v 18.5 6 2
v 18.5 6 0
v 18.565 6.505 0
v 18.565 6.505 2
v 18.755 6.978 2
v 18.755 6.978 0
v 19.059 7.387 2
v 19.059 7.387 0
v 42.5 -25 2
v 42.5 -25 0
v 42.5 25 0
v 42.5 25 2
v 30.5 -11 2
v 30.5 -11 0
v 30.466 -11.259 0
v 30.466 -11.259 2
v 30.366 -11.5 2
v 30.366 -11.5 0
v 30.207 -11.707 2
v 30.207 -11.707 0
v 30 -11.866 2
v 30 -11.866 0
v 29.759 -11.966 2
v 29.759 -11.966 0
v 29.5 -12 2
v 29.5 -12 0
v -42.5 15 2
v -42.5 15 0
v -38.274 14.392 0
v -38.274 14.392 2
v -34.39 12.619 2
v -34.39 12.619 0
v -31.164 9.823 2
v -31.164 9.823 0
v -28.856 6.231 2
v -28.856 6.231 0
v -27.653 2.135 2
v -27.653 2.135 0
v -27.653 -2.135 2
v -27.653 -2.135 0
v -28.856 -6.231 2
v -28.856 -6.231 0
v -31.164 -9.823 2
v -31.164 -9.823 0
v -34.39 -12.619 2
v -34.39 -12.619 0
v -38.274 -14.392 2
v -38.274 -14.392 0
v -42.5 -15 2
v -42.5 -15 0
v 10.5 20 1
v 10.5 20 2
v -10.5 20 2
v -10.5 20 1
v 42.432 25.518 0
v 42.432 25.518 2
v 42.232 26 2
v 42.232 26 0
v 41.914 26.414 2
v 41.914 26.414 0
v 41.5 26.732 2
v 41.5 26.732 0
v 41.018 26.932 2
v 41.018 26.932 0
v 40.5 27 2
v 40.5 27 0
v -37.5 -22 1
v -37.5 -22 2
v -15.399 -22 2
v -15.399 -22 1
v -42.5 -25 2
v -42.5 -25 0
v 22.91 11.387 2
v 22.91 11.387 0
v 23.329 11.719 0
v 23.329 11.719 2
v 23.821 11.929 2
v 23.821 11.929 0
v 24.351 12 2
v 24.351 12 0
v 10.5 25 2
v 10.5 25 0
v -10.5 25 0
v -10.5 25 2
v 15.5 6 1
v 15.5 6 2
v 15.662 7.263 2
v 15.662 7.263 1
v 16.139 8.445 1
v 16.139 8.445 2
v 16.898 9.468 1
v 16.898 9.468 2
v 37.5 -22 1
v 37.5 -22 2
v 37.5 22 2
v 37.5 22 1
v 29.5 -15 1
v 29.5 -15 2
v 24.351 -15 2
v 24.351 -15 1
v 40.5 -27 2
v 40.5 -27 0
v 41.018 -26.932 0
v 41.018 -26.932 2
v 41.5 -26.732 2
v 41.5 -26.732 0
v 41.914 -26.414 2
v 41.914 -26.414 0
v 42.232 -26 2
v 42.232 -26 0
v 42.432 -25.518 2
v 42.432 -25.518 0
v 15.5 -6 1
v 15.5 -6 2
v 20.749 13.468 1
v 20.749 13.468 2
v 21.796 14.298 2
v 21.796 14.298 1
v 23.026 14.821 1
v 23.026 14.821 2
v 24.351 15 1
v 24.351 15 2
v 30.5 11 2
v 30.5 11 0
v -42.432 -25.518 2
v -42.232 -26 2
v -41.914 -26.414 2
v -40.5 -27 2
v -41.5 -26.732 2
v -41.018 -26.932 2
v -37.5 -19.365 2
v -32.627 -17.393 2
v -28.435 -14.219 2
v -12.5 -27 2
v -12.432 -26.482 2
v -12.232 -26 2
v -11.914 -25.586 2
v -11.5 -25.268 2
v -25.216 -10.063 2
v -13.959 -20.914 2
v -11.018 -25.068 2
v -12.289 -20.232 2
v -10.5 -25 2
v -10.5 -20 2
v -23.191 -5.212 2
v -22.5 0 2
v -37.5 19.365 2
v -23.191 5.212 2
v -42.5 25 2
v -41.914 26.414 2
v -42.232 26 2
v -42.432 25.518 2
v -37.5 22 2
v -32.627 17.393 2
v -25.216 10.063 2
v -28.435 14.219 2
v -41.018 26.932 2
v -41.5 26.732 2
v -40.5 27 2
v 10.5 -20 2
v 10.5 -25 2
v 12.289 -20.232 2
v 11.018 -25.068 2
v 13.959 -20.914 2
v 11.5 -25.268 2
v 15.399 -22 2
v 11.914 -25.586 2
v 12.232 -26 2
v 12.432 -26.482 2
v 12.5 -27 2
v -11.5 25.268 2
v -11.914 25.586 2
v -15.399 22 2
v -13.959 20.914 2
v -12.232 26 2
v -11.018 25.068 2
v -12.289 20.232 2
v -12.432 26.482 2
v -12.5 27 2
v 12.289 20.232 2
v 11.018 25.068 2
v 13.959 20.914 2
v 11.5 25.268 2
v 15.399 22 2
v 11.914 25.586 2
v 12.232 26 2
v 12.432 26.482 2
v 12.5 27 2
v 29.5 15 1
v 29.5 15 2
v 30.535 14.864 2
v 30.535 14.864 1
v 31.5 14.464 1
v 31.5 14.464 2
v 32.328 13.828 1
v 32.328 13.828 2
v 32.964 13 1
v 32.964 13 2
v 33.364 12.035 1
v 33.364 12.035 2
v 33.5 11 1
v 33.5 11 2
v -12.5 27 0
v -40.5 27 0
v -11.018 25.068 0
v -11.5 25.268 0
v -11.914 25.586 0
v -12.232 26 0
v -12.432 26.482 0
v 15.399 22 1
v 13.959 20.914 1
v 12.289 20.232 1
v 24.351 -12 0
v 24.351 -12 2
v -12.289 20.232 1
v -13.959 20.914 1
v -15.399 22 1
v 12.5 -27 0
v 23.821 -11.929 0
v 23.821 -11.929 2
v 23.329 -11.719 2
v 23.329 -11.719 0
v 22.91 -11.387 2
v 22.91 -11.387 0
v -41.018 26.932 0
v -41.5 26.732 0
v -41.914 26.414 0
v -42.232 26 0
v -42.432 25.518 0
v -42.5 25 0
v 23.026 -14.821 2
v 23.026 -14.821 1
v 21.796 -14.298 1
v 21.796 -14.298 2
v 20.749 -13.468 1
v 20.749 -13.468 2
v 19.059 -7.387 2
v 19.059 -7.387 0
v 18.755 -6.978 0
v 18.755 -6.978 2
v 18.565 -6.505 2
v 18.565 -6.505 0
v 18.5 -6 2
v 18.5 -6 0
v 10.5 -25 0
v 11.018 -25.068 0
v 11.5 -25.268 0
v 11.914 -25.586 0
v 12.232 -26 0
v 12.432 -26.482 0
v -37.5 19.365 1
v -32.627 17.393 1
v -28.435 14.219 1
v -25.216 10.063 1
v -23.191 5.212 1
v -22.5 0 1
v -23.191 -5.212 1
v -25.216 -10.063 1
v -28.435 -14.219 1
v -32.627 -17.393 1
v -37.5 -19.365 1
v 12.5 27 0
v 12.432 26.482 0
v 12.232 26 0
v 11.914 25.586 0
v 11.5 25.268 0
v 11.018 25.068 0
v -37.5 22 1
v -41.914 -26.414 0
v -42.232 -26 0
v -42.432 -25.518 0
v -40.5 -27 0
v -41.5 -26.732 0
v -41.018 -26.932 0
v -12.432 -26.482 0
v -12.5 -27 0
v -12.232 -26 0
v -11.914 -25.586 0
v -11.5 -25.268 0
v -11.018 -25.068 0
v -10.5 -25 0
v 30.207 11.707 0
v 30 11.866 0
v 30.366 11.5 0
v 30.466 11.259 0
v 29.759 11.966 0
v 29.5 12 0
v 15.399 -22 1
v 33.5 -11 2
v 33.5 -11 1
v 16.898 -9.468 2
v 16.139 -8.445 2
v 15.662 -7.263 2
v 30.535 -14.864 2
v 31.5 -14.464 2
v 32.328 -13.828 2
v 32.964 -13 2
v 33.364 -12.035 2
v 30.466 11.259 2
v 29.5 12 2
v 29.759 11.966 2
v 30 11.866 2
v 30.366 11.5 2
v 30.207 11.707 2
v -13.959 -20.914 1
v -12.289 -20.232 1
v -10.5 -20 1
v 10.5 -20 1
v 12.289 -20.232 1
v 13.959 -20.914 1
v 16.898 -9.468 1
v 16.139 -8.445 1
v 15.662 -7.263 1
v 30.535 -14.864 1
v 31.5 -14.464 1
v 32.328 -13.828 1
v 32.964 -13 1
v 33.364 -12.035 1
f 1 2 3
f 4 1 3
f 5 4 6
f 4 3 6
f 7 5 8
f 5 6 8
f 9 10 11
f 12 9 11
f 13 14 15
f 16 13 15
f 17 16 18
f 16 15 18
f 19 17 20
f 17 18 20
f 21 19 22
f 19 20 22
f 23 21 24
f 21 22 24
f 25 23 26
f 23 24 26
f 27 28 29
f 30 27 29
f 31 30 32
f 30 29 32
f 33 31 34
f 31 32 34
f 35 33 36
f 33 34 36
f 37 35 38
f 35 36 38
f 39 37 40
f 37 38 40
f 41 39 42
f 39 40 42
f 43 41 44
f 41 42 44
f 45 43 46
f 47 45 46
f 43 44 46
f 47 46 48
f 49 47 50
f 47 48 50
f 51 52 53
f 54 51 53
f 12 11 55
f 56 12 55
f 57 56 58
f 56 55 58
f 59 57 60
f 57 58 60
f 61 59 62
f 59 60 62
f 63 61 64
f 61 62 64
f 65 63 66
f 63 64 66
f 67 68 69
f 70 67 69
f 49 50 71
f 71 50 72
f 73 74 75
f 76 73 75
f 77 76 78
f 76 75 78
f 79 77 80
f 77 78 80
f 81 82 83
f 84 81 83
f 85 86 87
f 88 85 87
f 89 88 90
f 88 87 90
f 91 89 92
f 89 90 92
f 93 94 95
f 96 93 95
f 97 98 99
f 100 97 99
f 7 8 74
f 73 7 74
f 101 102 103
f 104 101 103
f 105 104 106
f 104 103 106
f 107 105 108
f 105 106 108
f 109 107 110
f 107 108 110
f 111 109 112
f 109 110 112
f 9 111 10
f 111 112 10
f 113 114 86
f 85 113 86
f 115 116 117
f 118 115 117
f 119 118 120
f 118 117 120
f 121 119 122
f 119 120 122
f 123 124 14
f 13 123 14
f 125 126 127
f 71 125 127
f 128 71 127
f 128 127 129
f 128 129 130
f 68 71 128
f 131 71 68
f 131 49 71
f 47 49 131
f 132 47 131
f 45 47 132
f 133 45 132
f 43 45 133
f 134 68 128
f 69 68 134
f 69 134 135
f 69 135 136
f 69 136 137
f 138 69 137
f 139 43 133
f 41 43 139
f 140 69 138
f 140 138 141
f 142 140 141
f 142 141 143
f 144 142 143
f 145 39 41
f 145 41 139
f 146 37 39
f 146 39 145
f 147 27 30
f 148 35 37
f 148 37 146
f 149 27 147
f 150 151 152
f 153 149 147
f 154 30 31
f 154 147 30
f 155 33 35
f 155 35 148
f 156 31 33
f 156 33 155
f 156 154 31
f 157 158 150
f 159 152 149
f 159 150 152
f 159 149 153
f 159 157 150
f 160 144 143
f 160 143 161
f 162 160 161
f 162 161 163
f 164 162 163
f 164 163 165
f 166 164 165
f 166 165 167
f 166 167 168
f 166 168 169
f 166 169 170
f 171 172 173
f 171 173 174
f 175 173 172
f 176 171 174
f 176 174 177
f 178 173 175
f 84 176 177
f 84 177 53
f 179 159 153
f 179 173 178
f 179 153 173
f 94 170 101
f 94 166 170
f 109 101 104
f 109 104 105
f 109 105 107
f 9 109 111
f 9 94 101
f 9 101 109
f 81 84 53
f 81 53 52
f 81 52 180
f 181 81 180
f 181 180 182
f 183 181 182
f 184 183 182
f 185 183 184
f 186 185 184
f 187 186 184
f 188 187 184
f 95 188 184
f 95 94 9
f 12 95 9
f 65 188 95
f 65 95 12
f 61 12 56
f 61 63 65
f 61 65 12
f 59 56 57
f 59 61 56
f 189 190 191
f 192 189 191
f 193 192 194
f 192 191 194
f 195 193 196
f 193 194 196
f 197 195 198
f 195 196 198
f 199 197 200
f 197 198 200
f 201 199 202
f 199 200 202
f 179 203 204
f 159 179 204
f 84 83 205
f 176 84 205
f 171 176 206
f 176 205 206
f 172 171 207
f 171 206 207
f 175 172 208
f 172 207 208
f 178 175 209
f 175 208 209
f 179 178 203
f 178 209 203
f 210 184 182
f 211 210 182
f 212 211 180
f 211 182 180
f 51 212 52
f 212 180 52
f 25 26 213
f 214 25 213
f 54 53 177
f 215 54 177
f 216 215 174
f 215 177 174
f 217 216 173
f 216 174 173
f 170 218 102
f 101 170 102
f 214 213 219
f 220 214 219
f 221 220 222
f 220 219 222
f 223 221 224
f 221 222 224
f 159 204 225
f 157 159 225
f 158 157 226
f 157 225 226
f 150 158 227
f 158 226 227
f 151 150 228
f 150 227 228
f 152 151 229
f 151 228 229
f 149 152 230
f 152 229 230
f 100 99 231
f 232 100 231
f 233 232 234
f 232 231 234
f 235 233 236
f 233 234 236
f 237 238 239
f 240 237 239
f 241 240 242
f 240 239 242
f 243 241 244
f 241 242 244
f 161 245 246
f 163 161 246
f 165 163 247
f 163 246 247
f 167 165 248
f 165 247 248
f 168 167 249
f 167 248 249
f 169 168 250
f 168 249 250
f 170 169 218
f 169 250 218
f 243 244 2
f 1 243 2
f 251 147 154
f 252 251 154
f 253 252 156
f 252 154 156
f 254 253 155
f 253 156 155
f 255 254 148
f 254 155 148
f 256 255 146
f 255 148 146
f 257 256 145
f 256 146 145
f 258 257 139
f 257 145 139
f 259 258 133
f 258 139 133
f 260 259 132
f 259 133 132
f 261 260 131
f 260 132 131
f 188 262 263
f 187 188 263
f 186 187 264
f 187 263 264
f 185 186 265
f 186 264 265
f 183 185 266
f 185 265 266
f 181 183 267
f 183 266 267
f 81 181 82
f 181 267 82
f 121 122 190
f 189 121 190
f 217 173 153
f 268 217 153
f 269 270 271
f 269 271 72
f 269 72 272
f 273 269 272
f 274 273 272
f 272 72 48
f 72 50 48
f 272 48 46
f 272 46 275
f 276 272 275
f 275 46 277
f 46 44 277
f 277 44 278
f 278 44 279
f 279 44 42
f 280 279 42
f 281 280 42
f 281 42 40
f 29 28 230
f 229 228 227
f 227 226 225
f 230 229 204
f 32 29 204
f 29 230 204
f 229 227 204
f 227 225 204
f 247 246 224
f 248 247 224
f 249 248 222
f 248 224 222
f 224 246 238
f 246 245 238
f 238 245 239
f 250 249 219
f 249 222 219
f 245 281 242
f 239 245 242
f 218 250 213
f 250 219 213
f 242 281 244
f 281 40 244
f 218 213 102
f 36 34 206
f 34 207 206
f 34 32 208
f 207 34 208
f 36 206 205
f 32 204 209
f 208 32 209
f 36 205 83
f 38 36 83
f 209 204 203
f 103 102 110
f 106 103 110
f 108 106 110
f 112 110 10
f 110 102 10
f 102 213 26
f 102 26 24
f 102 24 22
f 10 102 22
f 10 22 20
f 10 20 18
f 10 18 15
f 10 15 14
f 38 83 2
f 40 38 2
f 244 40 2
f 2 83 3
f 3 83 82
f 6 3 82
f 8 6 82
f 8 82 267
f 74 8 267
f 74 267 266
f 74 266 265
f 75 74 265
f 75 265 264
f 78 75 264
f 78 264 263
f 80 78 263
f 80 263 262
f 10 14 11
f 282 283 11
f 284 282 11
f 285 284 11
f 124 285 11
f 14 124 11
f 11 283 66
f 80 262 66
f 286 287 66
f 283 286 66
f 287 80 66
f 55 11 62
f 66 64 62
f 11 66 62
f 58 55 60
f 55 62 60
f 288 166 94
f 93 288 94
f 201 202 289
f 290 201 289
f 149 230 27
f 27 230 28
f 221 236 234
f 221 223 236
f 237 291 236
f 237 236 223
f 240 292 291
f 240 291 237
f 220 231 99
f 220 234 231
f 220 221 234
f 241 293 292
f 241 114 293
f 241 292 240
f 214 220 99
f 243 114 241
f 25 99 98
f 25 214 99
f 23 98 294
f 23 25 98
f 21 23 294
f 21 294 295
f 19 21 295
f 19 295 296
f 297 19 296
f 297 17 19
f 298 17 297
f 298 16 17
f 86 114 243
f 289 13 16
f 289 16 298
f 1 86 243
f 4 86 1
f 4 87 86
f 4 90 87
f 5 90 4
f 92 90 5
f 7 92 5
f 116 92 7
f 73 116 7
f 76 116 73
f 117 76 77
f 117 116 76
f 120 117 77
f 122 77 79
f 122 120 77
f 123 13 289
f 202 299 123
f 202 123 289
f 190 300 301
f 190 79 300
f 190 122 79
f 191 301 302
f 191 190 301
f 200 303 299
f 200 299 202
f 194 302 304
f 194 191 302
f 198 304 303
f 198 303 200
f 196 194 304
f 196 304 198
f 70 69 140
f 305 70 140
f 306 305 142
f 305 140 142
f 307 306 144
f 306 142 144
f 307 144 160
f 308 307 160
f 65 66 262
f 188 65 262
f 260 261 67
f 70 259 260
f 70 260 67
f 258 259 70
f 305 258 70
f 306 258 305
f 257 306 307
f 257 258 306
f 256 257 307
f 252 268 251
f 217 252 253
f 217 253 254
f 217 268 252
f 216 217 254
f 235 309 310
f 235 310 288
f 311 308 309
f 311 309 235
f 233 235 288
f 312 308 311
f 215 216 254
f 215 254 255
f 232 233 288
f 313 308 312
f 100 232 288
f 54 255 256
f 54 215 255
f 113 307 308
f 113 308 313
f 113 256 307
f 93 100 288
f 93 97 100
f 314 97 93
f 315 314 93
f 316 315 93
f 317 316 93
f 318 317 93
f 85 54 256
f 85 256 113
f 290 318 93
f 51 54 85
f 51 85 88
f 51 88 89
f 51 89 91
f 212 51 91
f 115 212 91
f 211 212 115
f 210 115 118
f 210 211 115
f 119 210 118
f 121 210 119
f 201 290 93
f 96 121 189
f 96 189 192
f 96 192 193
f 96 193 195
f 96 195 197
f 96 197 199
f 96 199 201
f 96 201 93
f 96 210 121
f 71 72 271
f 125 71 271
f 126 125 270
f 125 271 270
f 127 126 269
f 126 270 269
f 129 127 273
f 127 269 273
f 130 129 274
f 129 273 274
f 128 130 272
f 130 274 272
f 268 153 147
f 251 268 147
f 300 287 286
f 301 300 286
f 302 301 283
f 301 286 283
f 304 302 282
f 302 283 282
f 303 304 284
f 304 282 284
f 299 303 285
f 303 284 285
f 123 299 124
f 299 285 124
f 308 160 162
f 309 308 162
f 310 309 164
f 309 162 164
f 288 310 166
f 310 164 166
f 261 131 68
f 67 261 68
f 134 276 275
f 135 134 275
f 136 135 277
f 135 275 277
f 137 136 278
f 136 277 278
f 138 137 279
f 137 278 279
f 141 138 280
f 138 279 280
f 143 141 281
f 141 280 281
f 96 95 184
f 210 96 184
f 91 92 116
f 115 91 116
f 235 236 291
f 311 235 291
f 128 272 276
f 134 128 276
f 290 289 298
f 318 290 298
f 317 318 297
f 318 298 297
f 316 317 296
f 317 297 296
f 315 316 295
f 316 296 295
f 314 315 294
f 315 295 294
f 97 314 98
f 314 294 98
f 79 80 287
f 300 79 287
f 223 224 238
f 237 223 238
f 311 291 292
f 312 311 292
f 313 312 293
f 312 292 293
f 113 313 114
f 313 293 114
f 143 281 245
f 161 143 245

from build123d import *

# Parameters (mm, degrees)
F1_DEPTH = 2
F3_DEPTH = 1


with BuildPart() as f1:
    # F0 (on Top) → F1 (new body)
    with BuildSketch(Plane.XY):
        with BuildLine():
            Line((12.5, -27), (40.5, -27))
            ThreePointArc((40.5, -27), (41.914214, -26.414214), (42.5, -25))
            Line((42.5, -25), (42.5, 25))
            ThreePointArc((42.5, 25), (41.914214, 26.414214), (40.5, 27))
            Line((40.5, 27), (12.5, 27))
            ThreePointArc((12.5, 27), (11.914214, 25.585786), (10.5, 25))
            Line((10.5, 25), (-10.5, 25))
            ThreePointArc((-10.5, 25), (-11.914214, 25.585786), (-12.5, 27))
            Line((-12.5, 27), (-40.5, 27))
            ThreePointArc((-40.5, 27), (-41.914214, 26.414214), (-42.5, 25))
            Line((-42.5, 25), (-42.5, 15))
            ThreePointArc((-42.5, 15), (-27.5, 0), (-42.5, -15))
            Line((-42.5, -15), (-42.5, -25))
            ThreePointArc((-42.5, -25), (-41.914214, -26.414214), (-40.5, -27))
            Line((-40.5, -27), (-12.5, -27))
            ThreePointArc((-12.5, -27), (-11.914214, -25.585786), (-10.5, -25))
            Line((-10.5, -25), (10.5, -25))
            ThreePointArc((10.5, -25), (11.914213, -25.585787), (12.5, -27))
        make_face()
        with BuildLine():
            Line((30.5, 11), (30.5, 0))
            Line((30.5, 0), (30.5, -11))
            ThreePointArc((30.5, -11), (30.207107, -11.707107), (29.5, -12))
            Line((29.5, -12), (24.350781, -12))
            ThreePointArc((24.350781, -12), (23.567891, -11.840403), (22.909948, -11.387083))
            Line((22.909948, -11.387083), (19.059167, -7.387083))
            ThreePointArc((19.059167, -7.387083), (18.645052, -6.747775), (18.5, -6))
            Line((18.5, -6), (18.5, 0))
            Line((18.5, 0), (18.5, 6))
            ThreePointArc((18.5, 6), (18.645052, 6.747775), (19.059167, 7.387083))
            Line((19.059167, 7.387083), (22.909948, 11.387083))
            ThreePointArc((22.909948, 11.387083), (23.567891, 11.840403), (24.350781, 12))
            Line((24.350781, 12), (29.5, 12))
            ThreePointArc((29.5, 12), (30.207107, 11.707107), (30.5, 11))
        make_face(mode=Mode.SUBTRACT)
    extrude(amount=F1_DEPTH)

    # F2 (on face) → F3 (cut)
    with BuildSketch(Plane.XY.offset(2)):
        with BuildLine():
            Line((-10.5, -20), (10.5, -20))
            ThreePointArc((10.5, -20), (13.145751, -20.519259), (15.398979, -22))
            Line((15.398979, -22), (37.5, -22))
            Line((37.5, -22), (37.5, 22))
            Line((37.5, 22), (15.398979, 22))
            ThreePointArc((15.398979, 22), (13.145751, 20.519259), (10.5, 20))
            Line((10.5, 20), (-10.5, 20))
            ThreePointArc((-10.5, 20), (-13.145751, 20.519259), (-15.398979, 22))
            Line((-15.398979, 22), (-37.5, 22))
            Line((-37.5, 22), (-37.5, 19.364917))
            ThreePointArc((-37.5, 19.364917), (-22.5, 0), (-37.5, -19.364917))
            Line((-37.5, -19.364917), (-37.5, -22))
            Line((-37.5, -22), (-15.398979, -22))
            ThreePointArc((-15.398979, -22), (-13.145751, -20.519259), (-10.5, -20))
        make_face()
        with BuildLine():
            ThreePointArc((29.5, 15), (32.328427, 13.828427), (33.5, 11))
            Line((33.5, 11), (33.5, -11))
            ThreePointArc((33.5, -11), (32.328427, -13.828427), (29.5, -15))
            Line((29.5, -15), (24.350781, -15))
            ThreePointArc((24.350781, -15), (22.393556, -14.601008), (20.748698, -13.467708))
            Line((20.748698, -13.467708), (16.897917, -9.467708))
            ThreePointArc((16.897917, -9.467708), (15.862629, -7.869437), (15.5, -6))
            Line((15.5, -6), (15.5, 6))
            ThreePointArc((15.5, 6), (15.862629, 7.869437), (16.897917, 9.467708))
            Line((16.897917, 9.467708), (20.748698, 13.467708))
            ThreePointArc((20.748698, 13.467708), (22.393556, 14.601008), (24.350781, 15))
            Line((24.350781, 15), (29.5, 15))
        make_face(mode=Mode.SUBTRACT)
    extrude(amount=-F3_DEPTH, mode=Mode.SUBTRACT)


solid = f1.part
